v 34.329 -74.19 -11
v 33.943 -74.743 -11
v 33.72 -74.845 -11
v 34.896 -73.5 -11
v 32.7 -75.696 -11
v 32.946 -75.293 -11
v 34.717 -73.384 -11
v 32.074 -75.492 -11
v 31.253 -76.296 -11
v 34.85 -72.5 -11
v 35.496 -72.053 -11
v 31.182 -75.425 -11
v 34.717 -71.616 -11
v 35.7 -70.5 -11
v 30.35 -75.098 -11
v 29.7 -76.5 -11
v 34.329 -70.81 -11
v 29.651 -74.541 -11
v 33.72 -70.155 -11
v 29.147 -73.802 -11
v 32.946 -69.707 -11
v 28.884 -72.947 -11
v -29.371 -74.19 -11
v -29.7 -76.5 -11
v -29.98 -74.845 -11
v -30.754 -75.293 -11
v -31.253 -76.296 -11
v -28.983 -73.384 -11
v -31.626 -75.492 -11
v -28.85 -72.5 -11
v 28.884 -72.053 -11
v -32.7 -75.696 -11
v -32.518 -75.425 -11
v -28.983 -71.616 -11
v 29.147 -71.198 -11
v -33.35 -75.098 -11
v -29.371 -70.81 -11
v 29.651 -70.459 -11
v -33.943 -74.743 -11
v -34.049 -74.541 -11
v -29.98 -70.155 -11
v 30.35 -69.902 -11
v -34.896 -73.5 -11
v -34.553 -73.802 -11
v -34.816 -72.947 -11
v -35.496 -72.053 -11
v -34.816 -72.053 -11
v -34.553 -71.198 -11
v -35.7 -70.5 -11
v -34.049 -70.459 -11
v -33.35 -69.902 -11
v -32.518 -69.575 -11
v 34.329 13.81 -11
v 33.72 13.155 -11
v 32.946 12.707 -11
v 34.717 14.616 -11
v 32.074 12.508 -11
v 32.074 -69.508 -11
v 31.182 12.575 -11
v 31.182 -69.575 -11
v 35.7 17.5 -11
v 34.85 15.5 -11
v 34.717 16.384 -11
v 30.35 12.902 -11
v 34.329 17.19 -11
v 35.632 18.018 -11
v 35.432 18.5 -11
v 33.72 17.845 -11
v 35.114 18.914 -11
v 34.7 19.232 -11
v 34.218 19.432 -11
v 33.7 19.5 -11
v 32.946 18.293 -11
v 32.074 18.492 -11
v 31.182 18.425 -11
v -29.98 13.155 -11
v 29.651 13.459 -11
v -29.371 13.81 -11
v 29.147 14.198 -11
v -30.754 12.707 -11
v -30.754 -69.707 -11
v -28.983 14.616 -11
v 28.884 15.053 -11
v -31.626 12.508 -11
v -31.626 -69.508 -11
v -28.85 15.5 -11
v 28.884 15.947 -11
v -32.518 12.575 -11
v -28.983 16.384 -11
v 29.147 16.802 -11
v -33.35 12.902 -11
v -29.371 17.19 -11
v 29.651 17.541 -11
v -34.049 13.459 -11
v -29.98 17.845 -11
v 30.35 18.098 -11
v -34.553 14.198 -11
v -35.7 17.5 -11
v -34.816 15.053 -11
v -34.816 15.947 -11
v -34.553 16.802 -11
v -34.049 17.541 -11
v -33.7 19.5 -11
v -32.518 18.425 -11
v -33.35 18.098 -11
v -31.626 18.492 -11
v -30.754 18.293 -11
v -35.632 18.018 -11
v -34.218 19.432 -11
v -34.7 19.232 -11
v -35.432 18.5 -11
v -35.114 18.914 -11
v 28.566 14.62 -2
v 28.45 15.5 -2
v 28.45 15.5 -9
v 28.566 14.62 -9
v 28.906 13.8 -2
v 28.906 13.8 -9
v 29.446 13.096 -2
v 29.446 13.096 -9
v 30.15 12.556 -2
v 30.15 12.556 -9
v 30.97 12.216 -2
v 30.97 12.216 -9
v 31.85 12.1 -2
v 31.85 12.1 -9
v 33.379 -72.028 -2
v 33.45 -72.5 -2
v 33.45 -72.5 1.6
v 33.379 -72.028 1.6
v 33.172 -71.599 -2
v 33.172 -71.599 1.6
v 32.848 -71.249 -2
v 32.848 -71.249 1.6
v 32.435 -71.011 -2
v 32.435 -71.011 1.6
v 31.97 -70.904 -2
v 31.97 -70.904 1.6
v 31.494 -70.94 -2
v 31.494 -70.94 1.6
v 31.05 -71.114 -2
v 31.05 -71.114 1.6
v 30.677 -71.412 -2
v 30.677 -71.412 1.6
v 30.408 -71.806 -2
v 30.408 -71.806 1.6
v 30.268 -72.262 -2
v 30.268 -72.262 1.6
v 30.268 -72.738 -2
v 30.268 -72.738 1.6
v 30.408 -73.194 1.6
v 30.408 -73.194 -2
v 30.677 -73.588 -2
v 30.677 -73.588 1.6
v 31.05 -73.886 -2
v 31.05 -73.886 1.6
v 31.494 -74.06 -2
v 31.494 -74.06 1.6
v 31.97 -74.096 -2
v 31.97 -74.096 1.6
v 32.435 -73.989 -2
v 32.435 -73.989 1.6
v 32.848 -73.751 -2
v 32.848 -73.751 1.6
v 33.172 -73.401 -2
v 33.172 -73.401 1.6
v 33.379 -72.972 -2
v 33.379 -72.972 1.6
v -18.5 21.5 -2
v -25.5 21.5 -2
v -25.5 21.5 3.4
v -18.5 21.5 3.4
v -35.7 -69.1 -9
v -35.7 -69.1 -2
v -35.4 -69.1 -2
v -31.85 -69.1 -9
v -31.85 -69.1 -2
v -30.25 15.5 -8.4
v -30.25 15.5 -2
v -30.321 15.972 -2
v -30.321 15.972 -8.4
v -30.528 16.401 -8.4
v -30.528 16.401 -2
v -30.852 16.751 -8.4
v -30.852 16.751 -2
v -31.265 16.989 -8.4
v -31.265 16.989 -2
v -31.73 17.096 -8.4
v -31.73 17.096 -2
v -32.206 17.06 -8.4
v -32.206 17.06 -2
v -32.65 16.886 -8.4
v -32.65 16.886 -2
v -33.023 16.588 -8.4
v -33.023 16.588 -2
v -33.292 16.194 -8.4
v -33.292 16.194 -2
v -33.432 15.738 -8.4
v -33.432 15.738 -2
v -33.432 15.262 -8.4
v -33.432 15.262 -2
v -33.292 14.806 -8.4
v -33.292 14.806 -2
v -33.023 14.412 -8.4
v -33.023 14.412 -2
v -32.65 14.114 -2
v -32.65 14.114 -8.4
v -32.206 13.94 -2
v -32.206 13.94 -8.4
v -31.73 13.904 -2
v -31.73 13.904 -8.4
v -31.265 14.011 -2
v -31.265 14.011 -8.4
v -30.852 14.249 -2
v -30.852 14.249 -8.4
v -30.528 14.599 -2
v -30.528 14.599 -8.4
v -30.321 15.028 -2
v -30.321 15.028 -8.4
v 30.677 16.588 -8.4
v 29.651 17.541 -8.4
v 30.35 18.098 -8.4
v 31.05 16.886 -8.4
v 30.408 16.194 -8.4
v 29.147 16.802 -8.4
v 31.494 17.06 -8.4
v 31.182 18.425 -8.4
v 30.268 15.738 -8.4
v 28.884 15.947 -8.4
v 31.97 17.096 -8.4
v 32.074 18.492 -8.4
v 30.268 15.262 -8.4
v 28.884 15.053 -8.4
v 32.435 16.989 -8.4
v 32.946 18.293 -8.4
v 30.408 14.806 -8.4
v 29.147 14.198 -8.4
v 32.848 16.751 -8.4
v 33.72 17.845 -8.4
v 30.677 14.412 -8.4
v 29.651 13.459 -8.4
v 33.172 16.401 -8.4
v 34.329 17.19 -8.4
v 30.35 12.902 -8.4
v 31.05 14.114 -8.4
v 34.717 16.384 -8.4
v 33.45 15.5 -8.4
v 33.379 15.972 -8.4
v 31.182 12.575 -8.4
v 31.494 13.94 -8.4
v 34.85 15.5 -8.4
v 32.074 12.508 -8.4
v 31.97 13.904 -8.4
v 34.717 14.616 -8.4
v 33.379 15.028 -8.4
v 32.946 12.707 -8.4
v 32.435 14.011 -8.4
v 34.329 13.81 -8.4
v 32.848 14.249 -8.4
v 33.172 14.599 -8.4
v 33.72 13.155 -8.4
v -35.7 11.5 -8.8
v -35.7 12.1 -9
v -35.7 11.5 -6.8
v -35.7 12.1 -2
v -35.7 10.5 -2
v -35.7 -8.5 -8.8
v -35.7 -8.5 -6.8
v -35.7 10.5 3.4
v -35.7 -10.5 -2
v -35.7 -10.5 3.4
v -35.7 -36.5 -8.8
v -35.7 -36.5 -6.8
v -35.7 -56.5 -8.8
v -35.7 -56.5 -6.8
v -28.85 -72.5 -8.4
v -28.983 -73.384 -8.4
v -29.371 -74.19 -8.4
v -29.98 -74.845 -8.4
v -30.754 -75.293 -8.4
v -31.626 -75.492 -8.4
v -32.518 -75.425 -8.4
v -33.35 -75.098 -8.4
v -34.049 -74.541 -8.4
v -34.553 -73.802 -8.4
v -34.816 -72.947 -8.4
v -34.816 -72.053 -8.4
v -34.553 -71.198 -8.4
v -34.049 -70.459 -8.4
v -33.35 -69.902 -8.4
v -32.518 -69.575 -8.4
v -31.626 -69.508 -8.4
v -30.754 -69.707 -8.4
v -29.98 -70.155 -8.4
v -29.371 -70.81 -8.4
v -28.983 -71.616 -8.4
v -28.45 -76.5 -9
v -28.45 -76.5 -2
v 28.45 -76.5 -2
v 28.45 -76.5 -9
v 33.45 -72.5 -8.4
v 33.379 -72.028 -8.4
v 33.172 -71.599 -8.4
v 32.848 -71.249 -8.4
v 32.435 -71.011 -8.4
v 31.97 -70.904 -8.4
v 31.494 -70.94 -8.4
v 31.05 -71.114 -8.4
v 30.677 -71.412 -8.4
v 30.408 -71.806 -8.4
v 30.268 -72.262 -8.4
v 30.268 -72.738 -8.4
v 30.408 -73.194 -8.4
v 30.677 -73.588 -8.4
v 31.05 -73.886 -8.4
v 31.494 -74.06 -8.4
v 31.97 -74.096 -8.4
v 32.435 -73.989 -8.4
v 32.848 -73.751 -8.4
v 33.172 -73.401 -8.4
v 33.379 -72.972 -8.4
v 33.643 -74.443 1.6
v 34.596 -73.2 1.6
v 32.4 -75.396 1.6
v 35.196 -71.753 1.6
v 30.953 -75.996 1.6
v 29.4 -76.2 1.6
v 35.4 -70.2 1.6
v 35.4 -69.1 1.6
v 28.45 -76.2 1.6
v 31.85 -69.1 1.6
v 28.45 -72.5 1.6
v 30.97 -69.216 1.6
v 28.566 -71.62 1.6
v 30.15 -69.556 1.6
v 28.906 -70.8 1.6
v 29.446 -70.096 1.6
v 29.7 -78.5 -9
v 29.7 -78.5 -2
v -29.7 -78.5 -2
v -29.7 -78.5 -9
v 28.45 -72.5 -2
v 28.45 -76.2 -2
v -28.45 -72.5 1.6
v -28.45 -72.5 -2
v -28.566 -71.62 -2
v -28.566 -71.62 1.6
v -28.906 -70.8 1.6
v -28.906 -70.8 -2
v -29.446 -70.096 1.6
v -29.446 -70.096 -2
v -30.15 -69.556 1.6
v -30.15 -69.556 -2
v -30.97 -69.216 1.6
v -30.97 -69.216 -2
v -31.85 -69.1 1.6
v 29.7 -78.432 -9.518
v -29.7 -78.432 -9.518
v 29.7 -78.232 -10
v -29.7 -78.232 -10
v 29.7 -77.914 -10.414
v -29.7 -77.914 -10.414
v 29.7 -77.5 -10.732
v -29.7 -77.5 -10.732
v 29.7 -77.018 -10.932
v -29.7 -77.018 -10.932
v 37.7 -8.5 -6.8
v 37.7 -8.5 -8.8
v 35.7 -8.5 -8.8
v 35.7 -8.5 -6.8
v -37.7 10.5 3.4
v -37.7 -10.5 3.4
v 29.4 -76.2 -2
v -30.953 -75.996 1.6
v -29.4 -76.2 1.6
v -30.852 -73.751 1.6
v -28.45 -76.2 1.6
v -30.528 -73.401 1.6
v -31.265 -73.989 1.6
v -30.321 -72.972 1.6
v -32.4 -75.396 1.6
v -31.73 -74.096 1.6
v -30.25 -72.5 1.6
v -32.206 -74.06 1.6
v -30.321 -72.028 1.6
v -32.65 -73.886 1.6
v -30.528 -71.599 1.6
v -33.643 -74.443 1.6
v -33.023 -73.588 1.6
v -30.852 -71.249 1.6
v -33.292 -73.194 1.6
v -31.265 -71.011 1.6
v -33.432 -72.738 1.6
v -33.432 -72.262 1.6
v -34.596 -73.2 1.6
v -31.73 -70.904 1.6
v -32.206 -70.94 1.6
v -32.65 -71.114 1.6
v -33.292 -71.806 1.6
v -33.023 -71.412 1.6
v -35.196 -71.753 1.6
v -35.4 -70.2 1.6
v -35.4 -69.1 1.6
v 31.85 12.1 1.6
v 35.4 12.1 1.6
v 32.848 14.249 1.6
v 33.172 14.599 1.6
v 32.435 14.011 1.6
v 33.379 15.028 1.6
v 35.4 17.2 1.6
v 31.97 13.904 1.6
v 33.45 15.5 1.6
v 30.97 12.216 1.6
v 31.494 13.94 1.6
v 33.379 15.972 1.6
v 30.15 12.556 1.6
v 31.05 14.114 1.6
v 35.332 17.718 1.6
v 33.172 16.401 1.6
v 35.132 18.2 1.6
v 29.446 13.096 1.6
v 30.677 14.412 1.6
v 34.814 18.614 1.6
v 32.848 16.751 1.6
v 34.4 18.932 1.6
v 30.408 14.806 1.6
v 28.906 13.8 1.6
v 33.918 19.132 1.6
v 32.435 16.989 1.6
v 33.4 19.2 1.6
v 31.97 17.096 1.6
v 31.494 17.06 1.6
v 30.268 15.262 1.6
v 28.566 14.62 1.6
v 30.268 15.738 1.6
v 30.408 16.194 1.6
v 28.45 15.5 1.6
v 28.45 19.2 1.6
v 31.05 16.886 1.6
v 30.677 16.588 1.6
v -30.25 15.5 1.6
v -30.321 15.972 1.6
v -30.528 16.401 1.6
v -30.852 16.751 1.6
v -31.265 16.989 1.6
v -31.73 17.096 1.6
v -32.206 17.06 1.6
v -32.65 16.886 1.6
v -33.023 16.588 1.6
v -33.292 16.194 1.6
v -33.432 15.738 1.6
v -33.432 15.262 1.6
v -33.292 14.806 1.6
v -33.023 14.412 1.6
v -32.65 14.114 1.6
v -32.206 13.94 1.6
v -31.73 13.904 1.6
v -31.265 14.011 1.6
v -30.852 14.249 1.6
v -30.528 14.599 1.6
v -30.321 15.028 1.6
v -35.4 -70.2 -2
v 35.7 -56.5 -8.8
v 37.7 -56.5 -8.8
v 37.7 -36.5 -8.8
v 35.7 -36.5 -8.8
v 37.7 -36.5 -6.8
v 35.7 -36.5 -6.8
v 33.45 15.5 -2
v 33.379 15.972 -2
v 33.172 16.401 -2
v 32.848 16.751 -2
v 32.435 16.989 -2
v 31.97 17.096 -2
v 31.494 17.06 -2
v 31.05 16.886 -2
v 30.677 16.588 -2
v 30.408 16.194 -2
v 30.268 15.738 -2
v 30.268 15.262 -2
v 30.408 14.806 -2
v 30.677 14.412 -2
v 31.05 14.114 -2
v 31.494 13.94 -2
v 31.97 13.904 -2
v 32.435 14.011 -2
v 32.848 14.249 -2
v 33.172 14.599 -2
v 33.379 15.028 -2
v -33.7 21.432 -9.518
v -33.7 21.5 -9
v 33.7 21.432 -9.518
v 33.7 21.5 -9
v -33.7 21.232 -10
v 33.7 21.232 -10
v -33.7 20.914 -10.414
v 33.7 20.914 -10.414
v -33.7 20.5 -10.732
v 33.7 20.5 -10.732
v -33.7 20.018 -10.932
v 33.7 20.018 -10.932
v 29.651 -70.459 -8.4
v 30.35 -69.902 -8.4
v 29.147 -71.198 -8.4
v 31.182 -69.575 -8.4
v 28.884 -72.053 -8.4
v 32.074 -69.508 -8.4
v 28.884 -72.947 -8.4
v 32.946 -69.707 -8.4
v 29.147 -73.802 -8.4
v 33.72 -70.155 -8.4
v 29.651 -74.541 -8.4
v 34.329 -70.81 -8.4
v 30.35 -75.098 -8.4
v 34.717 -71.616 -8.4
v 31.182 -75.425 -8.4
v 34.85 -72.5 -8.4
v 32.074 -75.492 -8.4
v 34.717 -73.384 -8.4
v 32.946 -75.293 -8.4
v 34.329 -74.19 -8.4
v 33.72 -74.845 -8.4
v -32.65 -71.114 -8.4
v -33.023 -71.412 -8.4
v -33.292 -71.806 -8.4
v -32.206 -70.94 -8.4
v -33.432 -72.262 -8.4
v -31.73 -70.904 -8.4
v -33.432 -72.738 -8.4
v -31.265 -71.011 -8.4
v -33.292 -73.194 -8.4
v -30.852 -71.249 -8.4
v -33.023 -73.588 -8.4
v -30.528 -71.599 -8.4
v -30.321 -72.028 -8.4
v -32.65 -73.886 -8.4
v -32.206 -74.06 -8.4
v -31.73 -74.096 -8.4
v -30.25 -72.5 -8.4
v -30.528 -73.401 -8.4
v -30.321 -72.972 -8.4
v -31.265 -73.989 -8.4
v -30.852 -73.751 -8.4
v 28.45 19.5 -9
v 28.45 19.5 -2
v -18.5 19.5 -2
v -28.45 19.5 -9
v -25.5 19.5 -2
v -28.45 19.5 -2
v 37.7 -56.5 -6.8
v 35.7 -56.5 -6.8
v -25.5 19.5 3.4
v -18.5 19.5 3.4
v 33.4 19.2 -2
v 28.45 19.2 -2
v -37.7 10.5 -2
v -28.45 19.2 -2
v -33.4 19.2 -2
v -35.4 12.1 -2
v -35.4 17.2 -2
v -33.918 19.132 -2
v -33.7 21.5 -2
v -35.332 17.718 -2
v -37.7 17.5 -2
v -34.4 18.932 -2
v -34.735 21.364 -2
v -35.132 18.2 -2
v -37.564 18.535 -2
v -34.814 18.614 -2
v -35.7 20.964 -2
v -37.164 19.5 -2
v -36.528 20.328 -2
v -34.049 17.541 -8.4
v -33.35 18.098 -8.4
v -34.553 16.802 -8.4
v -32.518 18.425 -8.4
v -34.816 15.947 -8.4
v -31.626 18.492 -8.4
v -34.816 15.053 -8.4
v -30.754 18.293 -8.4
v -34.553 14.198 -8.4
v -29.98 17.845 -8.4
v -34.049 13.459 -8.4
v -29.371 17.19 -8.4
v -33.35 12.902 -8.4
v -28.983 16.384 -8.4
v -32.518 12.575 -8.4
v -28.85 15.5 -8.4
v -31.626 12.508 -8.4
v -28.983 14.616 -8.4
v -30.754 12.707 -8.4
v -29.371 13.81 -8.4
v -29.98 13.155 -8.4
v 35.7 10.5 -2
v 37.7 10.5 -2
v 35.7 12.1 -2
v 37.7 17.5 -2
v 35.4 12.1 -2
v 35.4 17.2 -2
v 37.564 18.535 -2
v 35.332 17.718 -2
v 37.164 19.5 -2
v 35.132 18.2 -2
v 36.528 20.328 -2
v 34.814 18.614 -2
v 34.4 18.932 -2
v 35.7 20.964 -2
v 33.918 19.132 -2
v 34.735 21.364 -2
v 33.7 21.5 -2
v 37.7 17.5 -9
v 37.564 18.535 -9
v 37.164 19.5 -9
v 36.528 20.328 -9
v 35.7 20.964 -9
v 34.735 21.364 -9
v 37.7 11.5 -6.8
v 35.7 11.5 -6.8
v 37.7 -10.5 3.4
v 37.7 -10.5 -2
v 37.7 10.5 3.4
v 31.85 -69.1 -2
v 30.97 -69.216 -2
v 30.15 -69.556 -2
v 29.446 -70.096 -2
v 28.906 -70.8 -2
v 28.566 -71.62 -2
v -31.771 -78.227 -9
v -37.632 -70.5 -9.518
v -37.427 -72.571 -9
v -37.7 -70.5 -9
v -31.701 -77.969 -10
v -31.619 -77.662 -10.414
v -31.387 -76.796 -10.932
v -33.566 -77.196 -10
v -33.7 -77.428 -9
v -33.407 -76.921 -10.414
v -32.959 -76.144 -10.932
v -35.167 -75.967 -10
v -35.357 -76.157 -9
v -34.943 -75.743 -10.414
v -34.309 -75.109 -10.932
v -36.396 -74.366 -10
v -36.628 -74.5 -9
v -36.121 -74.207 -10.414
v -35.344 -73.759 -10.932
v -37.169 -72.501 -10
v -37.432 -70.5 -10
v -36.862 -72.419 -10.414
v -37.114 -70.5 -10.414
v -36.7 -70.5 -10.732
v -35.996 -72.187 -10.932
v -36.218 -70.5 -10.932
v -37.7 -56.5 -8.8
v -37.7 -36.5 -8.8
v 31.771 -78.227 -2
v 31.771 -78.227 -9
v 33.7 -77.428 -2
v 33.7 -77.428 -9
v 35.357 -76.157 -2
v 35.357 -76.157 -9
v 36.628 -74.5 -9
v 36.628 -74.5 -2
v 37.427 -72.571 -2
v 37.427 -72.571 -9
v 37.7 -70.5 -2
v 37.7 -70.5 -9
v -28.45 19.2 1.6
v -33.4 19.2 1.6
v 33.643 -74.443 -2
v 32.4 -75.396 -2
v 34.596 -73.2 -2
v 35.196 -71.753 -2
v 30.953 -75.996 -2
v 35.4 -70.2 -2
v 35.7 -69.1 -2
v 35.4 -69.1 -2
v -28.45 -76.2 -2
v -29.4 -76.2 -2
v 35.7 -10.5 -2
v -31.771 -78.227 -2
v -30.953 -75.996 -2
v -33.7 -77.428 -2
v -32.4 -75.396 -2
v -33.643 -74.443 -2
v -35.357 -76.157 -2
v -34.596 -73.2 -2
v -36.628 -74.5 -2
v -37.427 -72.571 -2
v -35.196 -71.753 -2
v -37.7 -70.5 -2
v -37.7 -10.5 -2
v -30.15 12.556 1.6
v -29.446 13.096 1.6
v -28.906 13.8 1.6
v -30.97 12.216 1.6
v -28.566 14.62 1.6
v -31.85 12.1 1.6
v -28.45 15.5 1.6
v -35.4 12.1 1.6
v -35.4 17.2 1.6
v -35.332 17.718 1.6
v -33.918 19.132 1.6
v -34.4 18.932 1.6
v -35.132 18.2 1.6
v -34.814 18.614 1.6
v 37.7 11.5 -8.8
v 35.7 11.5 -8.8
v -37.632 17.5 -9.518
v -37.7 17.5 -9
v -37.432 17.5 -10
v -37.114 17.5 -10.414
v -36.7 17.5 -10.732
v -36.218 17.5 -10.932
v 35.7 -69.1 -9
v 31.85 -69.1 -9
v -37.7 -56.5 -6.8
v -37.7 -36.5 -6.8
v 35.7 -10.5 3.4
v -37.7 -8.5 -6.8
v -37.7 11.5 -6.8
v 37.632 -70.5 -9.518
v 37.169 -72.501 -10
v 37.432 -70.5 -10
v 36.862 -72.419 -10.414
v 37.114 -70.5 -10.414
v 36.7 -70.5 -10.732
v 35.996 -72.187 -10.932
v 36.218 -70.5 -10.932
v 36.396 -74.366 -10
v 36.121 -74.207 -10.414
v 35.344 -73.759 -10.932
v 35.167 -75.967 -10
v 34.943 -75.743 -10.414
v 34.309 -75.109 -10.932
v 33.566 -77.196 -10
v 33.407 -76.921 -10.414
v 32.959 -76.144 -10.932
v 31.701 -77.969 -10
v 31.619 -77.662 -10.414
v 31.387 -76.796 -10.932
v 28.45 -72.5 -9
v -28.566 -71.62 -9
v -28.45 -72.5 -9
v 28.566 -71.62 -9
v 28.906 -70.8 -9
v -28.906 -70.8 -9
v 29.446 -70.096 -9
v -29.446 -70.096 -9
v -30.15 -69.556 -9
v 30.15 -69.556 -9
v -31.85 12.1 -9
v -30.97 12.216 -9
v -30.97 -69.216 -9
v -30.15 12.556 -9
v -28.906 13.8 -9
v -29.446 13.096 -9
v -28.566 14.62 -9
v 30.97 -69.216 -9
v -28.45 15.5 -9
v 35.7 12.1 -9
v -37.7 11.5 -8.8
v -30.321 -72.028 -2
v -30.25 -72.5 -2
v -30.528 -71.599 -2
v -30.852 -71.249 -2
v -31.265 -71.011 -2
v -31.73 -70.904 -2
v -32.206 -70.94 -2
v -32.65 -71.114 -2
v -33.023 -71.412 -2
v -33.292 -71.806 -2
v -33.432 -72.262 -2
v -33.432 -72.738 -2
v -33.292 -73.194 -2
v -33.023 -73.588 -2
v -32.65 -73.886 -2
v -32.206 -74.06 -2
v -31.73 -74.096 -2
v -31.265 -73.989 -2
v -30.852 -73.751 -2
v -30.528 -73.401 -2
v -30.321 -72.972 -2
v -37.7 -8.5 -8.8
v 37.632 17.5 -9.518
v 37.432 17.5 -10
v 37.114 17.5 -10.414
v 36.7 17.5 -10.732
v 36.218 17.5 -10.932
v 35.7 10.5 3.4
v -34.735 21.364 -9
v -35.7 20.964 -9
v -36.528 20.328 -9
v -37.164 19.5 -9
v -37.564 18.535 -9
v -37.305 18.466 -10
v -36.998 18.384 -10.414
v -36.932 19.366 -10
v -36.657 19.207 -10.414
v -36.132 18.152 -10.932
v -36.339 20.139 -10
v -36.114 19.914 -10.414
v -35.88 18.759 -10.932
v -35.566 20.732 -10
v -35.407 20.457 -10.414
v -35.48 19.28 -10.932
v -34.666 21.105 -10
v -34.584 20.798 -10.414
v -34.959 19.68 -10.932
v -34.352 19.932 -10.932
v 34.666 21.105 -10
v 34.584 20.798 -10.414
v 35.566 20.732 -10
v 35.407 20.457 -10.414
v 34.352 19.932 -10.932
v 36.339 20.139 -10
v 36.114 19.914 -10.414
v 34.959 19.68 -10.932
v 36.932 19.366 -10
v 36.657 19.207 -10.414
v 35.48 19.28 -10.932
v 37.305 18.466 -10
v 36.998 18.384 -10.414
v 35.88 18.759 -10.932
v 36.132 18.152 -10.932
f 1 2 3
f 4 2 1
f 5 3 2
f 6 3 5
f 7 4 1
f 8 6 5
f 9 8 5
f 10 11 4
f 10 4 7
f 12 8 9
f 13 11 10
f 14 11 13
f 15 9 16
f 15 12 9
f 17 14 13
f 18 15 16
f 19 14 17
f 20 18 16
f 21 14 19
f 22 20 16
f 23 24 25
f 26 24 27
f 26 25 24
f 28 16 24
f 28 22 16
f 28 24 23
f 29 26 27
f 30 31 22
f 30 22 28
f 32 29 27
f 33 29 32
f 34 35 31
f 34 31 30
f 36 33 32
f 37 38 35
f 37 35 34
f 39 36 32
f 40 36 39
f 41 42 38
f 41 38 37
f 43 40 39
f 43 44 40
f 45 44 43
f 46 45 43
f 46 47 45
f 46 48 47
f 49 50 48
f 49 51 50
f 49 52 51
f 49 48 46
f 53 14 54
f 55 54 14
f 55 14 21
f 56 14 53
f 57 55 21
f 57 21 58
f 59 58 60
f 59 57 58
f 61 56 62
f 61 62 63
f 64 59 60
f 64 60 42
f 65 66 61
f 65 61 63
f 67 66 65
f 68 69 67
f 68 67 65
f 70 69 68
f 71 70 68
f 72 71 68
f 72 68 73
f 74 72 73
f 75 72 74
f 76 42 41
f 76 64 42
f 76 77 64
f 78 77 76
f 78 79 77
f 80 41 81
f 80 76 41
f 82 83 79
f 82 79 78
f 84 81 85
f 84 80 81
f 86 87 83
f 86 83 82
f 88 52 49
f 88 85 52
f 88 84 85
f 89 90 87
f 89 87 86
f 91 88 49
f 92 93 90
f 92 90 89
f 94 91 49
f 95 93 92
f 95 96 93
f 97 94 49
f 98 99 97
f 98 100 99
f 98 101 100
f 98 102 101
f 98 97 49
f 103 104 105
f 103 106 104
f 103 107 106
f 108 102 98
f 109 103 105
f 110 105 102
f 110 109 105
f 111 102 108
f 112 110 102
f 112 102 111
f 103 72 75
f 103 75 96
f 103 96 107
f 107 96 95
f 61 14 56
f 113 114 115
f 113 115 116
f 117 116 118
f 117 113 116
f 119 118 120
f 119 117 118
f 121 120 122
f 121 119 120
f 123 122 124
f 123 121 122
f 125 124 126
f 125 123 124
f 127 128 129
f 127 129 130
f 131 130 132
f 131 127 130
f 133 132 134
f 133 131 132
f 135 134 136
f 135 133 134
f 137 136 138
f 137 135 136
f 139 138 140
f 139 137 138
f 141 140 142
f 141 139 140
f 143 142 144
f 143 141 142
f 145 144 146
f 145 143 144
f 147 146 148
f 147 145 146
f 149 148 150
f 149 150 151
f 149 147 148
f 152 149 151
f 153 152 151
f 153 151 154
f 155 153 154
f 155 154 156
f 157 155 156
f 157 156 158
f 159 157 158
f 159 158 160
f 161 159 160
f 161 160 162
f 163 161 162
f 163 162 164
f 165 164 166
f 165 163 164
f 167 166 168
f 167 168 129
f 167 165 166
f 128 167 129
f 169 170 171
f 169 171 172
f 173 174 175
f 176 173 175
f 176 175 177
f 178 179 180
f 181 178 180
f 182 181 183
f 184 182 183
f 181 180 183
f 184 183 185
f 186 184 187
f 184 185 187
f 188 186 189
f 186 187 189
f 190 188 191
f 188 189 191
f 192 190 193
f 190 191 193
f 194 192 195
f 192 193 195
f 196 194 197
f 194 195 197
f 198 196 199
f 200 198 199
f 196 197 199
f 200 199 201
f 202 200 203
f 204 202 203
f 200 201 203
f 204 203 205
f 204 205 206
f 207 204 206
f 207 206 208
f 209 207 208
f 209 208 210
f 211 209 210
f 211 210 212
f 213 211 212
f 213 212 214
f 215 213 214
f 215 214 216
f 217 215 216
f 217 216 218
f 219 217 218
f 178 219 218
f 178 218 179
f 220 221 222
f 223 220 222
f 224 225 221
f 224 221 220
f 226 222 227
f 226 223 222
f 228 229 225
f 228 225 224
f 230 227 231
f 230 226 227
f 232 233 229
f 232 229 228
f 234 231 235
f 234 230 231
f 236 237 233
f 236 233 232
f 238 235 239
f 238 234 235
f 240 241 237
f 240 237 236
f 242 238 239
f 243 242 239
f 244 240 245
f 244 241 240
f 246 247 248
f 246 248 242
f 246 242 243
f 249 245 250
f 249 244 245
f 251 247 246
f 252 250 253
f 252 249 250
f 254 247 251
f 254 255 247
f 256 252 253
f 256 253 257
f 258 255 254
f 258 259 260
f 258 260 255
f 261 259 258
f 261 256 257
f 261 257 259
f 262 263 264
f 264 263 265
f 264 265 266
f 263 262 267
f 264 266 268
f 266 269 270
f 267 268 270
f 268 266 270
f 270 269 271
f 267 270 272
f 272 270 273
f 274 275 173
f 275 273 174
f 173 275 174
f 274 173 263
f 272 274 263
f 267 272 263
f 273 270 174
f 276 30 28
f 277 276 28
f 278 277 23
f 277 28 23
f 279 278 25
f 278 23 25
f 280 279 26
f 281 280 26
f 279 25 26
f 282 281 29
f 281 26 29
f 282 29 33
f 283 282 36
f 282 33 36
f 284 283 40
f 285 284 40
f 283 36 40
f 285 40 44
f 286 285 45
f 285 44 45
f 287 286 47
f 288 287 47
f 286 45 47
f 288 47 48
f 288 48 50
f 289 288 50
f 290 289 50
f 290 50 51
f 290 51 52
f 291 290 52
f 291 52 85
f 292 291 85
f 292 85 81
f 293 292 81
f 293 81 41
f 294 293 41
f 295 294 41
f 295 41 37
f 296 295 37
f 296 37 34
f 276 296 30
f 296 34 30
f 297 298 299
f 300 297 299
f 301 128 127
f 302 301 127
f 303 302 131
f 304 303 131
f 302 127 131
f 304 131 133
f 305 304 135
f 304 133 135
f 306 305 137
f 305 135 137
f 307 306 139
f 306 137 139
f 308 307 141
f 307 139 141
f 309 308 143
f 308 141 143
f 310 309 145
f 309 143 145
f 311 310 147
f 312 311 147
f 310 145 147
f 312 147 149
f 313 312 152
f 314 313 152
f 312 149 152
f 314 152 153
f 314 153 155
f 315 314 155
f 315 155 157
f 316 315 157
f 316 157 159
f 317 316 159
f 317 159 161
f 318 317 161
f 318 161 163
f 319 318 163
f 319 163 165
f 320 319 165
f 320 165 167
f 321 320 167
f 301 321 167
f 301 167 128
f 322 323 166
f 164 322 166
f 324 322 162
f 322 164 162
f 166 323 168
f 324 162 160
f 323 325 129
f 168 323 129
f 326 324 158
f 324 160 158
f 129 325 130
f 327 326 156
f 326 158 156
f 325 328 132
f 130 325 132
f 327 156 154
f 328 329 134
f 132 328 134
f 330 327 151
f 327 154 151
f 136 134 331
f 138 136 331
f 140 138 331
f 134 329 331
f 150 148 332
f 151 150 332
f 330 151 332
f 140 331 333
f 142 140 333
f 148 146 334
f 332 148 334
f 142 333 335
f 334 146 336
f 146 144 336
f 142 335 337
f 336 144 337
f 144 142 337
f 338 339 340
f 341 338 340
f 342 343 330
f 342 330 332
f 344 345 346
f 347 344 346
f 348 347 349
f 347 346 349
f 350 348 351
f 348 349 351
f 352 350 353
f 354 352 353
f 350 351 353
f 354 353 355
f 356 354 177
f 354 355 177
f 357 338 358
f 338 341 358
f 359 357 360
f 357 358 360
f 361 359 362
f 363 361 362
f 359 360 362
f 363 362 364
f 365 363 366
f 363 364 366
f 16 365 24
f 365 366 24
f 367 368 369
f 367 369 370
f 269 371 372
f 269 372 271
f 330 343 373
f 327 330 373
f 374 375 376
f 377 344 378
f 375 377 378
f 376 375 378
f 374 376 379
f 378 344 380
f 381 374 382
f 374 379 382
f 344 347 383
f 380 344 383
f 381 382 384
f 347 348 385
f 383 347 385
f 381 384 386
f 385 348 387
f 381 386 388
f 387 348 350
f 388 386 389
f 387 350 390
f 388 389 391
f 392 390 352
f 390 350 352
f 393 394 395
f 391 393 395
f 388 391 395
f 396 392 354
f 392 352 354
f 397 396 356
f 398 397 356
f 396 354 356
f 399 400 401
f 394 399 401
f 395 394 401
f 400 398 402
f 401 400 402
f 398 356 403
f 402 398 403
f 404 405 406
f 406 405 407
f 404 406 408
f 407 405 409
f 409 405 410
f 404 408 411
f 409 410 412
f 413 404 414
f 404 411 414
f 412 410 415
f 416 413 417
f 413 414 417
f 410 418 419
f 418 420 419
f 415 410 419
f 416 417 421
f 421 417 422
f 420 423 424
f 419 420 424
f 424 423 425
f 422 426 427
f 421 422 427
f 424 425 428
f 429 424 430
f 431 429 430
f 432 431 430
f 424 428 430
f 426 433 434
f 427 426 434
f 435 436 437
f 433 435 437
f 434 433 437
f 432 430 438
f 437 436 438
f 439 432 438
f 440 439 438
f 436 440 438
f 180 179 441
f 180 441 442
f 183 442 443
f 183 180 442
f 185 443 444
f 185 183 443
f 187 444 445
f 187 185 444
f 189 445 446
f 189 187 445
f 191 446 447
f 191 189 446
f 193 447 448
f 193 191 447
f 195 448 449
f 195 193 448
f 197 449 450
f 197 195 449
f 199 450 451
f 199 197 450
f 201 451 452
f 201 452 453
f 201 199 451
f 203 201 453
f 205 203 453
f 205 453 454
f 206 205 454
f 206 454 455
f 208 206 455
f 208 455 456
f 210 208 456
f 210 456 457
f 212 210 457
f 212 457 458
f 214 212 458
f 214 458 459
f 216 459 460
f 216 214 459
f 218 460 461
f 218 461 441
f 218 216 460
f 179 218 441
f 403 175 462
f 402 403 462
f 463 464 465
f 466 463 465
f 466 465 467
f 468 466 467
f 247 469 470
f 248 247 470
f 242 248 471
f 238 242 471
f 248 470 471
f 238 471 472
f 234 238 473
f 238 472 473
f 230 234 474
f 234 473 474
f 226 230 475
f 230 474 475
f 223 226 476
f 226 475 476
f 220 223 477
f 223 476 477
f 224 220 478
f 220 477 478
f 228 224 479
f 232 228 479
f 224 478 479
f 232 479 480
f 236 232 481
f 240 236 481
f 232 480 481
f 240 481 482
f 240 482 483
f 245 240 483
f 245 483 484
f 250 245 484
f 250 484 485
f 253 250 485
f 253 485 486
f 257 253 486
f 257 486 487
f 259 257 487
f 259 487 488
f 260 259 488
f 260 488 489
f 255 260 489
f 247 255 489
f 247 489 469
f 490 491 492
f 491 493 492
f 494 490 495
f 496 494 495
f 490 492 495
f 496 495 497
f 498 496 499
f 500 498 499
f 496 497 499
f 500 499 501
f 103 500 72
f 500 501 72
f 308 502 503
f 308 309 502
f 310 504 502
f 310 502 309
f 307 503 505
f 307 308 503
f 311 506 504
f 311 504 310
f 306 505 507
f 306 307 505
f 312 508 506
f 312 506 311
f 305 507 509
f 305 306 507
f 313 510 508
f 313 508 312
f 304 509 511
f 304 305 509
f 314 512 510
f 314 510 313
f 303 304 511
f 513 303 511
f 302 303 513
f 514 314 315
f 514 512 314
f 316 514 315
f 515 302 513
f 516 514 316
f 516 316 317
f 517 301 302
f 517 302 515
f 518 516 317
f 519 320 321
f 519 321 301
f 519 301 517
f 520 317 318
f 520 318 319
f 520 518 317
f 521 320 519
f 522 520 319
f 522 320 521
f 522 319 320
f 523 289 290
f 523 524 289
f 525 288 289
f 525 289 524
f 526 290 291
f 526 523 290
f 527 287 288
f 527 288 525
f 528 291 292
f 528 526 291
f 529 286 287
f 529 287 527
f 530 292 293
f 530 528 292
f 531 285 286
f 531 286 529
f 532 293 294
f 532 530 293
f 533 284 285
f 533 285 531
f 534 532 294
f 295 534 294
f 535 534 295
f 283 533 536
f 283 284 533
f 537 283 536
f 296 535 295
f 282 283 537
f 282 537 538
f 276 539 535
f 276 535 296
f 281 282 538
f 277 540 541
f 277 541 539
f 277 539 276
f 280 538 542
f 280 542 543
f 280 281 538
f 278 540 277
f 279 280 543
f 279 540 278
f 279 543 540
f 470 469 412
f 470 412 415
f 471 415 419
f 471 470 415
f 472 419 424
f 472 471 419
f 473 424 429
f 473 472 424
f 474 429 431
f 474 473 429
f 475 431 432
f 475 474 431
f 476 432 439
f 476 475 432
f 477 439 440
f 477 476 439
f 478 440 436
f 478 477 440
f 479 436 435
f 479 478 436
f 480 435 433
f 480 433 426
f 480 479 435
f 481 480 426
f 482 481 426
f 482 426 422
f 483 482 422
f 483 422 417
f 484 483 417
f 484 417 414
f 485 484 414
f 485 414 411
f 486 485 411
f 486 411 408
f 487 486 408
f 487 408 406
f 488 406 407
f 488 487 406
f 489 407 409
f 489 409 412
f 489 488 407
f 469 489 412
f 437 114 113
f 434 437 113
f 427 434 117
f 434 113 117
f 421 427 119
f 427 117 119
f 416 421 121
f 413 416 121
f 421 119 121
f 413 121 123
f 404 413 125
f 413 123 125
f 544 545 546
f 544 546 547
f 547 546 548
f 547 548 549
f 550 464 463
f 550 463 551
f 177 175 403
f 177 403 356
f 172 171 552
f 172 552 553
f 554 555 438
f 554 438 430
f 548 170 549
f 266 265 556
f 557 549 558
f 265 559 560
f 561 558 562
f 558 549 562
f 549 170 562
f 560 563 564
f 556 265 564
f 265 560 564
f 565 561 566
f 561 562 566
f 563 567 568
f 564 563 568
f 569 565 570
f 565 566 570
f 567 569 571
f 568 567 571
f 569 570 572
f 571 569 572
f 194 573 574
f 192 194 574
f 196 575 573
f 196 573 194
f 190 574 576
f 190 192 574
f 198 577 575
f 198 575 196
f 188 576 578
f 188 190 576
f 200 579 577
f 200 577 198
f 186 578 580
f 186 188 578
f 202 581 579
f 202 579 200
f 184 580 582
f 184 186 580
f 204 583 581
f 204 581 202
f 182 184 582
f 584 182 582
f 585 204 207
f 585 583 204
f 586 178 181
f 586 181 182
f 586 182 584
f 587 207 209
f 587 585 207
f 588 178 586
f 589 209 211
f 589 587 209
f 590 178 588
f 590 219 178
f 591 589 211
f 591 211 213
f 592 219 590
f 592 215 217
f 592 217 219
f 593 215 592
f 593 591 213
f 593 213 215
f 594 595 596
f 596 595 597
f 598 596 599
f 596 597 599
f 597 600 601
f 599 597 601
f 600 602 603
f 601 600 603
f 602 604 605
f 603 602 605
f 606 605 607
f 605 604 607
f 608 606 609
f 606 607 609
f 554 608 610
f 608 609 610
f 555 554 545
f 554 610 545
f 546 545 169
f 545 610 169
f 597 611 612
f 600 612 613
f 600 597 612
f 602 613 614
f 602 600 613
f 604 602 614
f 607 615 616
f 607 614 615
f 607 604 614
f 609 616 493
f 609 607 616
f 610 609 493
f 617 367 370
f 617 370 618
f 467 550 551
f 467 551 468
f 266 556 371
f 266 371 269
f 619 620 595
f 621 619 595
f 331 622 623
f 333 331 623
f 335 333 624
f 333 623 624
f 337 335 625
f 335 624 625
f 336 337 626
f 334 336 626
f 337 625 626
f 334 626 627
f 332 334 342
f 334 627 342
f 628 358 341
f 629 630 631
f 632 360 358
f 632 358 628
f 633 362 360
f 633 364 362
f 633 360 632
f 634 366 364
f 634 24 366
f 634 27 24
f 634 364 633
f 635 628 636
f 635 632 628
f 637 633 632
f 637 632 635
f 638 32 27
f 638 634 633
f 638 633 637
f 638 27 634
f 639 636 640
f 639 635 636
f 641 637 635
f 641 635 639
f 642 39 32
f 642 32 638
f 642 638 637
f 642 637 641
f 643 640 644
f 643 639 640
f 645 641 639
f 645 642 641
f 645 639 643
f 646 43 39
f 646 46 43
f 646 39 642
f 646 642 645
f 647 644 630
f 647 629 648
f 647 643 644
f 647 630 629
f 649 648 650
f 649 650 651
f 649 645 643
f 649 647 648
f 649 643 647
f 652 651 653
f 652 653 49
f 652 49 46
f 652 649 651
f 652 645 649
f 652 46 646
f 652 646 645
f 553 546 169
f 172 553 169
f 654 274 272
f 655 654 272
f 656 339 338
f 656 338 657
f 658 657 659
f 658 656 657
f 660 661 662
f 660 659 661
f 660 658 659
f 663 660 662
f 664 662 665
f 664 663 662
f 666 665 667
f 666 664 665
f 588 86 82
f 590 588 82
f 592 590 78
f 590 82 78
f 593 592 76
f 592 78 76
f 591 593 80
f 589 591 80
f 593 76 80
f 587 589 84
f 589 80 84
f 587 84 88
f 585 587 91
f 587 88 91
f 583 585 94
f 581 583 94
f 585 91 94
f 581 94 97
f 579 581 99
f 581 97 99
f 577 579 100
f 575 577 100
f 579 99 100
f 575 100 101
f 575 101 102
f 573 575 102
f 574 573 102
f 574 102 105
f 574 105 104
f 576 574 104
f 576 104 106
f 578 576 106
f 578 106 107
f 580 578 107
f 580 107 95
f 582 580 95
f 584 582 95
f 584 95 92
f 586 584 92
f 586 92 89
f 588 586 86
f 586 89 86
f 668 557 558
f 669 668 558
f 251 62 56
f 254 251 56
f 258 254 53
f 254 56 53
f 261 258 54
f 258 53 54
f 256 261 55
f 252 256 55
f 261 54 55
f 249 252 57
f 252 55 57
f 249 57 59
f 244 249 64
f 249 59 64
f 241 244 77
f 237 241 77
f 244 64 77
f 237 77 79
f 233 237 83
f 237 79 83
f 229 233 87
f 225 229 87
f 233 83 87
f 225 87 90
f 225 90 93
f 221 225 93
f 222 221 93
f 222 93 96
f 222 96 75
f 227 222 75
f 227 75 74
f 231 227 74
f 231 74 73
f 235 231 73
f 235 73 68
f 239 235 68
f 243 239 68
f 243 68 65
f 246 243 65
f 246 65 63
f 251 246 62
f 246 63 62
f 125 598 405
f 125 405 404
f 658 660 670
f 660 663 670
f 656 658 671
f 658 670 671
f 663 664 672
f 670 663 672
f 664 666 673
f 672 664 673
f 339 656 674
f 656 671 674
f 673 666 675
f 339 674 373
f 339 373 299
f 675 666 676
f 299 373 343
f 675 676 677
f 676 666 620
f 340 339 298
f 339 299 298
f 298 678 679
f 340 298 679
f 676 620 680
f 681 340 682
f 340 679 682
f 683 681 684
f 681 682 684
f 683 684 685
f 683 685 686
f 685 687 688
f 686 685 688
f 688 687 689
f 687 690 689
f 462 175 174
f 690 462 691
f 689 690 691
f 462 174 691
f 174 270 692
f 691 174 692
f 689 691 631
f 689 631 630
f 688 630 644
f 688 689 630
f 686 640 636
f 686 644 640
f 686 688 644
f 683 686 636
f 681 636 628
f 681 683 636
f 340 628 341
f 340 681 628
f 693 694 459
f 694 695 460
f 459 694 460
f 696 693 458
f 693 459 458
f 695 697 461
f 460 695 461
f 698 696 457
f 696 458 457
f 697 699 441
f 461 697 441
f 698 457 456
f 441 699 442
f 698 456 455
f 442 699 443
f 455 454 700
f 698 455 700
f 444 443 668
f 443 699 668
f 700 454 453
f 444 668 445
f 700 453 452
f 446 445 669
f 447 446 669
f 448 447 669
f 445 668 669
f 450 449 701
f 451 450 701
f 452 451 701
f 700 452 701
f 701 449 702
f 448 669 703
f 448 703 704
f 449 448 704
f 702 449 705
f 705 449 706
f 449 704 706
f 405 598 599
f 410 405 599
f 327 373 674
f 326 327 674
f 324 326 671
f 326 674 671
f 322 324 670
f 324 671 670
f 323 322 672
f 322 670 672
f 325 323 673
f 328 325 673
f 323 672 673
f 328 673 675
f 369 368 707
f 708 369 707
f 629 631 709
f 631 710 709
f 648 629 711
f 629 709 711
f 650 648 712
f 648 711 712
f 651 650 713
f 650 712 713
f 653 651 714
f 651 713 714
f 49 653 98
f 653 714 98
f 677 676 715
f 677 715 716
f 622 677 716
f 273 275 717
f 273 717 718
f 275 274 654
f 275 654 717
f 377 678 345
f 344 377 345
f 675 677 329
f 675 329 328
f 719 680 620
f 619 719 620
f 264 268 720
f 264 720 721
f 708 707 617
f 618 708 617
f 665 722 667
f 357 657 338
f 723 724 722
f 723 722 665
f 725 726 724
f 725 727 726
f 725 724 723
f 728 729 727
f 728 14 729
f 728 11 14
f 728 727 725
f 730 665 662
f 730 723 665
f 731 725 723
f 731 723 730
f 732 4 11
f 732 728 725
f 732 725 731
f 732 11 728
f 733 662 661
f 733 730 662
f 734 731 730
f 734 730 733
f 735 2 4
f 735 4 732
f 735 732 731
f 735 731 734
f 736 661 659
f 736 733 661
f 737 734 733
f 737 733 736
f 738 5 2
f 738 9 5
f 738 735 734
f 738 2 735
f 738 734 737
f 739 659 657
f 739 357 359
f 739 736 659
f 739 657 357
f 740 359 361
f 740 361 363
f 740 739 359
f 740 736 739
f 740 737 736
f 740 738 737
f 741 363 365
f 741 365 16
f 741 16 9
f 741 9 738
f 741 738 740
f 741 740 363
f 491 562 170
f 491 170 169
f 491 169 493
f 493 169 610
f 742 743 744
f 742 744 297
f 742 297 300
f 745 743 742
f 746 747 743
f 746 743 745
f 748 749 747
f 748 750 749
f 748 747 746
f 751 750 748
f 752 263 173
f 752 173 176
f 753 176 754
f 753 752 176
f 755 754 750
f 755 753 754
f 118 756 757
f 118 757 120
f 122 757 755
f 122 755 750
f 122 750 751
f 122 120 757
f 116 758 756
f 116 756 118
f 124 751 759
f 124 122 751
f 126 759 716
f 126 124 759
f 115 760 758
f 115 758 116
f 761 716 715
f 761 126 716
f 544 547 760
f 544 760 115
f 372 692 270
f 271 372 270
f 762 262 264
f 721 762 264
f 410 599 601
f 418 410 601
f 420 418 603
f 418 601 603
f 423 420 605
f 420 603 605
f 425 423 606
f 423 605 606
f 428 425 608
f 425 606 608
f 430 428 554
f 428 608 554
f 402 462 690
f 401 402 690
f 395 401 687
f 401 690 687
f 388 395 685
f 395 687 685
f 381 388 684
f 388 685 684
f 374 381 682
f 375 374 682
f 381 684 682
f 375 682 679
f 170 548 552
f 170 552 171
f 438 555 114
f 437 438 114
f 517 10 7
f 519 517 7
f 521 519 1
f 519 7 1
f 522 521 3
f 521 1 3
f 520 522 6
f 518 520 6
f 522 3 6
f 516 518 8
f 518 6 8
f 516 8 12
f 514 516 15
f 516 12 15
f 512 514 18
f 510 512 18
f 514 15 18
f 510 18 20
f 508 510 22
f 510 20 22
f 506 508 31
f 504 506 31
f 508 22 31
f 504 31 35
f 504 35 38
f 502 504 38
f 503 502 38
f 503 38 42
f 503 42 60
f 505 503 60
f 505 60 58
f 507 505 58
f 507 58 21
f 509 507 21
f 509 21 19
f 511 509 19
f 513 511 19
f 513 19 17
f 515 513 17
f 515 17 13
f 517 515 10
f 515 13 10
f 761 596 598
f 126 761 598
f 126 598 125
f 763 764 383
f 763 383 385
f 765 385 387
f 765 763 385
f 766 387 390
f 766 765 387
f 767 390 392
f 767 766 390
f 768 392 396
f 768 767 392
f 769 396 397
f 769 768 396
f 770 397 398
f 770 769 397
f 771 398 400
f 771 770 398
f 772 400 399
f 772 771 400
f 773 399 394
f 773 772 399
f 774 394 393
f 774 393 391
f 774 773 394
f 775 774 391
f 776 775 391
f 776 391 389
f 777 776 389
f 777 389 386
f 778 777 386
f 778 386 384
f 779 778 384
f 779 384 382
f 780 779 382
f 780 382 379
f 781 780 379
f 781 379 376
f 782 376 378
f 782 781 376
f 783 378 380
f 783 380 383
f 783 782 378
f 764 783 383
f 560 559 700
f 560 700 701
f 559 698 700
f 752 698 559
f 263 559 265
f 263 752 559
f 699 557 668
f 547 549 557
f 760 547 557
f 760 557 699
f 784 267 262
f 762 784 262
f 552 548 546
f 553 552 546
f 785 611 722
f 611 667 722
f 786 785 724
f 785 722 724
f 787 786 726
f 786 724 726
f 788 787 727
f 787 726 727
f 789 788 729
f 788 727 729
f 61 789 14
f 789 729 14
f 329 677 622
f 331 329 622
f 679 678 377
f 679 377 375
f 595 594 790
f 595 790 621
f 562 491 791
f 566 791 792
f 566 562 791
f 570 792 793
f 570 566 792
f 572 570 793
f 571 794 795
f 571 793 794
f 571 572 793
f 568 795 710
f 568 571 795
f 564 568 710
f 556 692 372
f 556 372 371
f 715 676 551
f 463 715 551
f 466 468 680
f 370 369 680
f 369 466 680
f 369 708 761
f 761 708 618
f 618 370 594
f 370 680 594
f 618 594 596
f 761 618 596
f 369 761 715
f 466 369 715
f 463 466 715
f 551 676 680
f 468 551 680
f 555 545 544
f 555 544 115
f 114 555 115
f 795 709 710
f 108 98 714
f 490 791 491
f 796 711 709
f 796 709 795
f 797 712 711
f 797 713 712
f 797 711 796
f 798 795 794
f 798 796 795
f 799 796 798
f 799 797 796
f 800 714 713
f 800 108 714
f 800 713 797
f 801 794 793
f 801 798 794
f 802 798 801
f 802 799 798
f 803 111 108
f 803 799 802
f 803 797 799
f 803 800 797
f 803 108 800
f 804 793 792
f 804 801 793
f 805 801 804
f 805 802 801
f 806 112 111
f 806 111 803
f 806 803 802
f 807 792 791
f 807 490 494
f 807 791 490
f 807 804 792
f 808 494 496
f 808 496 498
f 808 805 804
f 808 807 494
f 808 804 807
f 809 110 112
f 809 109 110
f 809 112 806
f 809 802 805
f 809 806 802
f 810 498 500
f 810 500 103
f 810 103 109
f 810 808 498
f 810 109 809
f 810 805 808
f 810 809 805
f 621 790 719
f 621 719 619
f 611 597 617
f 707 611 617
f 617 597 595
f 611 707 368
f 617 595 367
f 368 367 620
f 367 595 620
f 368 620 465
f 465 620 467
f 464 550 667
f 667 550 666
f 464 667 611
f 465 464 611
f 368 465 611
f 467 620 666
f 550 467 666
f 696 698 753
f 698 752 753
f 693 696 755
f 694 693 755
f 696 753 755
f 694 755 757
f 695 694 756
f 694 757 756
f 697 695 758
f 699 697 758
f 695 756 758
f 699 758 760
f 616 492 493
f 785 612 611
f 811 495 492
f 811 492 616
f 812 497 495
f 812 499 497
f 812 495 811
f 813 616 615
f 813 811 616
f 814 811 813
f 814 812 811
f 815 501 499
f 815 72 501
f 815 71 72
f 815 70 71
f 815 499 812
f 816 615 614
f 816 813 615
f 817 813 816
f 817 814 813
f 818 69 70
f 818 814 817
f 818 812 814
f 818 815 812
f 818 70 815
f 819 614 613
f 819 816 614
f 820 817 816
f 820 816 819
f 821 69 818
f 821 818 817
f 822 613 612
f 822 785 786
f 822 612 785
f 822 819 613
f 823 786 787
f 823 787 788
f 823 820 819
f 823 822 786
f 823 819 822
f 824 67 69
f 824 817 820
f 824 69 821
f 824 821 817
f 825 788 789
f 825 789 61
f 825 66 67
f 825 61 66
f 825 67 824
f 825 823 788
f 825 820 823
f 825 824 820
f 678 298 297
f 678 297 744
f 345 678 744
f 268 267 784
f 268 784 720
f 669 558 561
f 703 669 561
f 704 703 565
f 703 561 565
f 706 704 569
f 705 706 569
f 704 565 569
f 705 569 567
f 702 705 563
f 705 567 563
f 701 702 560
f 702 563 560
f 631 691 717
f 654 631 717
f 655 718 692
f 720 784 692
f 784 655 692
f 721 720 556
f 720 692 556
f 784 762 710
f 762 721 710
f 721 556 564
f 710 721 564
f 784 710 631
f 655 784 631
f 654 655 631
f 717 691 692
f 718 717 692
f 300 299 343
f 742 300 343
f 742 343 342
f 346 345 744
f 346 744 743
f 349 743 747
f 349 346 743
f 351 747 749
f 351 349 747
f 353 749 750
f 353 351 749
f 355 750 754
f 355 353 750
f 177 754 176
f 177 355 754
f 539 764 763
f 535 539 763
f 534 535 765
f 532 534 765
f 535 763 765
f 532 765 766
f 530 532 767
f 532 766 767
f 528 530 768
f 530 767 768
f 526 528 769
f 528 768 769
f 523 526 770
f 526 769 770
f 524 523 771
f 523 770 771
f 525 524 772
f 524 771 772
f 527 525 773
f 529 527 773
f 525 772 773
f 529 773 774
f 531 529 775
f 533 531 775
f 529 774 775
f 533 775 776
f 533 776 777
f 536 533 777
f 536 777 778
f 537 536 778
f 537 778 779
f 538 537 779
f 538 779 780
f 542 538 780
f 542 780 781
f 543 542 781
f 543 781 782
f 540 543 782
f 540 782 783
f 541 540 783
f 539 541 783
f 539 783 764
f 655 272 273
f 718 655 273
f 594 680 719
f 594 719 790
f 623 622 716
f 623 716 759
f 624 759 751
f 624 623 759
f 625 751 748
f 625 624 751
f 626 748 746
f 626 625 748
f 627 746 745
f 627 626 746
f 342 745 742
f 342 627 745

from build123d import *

# Parameters (mm, degrees)
PAD014_DEPTH    = 9
FILLET012_R     = 2
SKETCH024_R     = 3
POCKET009_DEPTH = 2.6
SKETCH025_R     = 1.6
POCKET010_DEPTH = 7
SKETCH026_R     = 1.6
PAD015_DEPTH    = 3.6
SKETCH027_W     = 2
SKETCH027_H     = 21
SKETCH027_W_2   = 7
SKETCH027_H_2   = 2
PAD016_DEPTH    = 5.4
SKETCH028_W     = 20
SKETCH028_H     = 2
POCKET011_DEPTH = 77.701


with BuildPart() as part:
    # Sketch023 → Pad014 (new body)
    with BuildSketch(Plane.XY):
        with BuildLine():
            Line((-33.7, 21.5), (33.7, 21.5))
            ThreePointArc((37.7, 17.5), (36.528427, 20.328427), (33.7, 21.5))
            Line((37.7, 17.5), (37.7, -70.5))
            ThreePointArc((29.7, -78.5), (35.356854, -76.156854), (37.7, -70.5))
            Line((29.7, -78.5), (-29.7, -78.5))
            ThreePointArc((-37.7, -70.5), (-35.356854, -76.156854), (-29.7, -78.5))
            Line((-37.7, -70.5), (-37.7, 17.5))
            ThreePointArc((-33.7, 21.5), (-36.528427, 20.328427), (-37.7, 17.5))
        make_face()
    extrude(amount=-PAD014_DEPTH)

    # Fillet012
    fillet012_edges = [part.edges().sort_by_distance(p)[0] for p in [
        (0, 21.5, -9),
    ]]
    fillet(fillet012_edges, radius=FILLET012_R)

    # Sketch024 (on Face8 of Fillet012) → Pocket009 (cut)
    with BuildSketch(Plane(origin=(0, 0, -9), x_dir=(1, 0, 0), z_dir=(0, 0, -1))):
        with Locations((-31.85, 72.5)):
            Circle(SKETCH024_R)
        with Locations((31.85, 72.5)):
            Circle(SKETCH024_R)
        with Locations((-31.85, -15.5)):
            Circle(SKETCH024_R)
        with Locations((31.85, -15.5)):
            Circle(SKETCH024_R)
    extrude(amount=-POCKET009_DEPTH, mode=Mode.SUBTRACT)

    # Sketch025 (on Face4 of Pocket009) → Pocket010 (cut)
    with BuildSketch(Plane.XY):
        with Locations((-31.85, 15.5)):
            Circle(SKETCH025_R)
        with Locations((31.85, 15.5)):
            Circle(SKETCH025_R)
        with Locations((31.85, -72.5)):
            Circle(SKETCH025_R)
        with Locations((-31.85, -72.5)):
            Circle(SKETCH025_R)
        with BuildLine():
            Line((-31.85, 12.1), (-35.7, 12.1))
            Line((-35.7, 12.1), (-35.7, -69.1))
            Line((-35.7, -69.1), (-31.85, -69.1))
            ThreePointArc((-28.45, -72.5), (-29.445837, -70.095837), (-31.85, -69.1))
            Line((-28.45, -76.5), (-28.45, -72.5))
            Line((-28.45, -76.5), (28.45, -76.5))
            Line((28.45, -76.5), (28.45, -72.5))
            ThreePointArc((31.85, -69.1), (29.445837, -70.095837), (28.45, -72.5))
            Line((35.7, -69.1), (31.85, -69.1))
            Line((35.7, -69.1), (35.7, 12.1))
            Line((35.7, 12.1), (31.85, 12.1))
            ThreePointArc((28.45, 15.5), (29.445837, 13.095837), (31.85, 12.1))
            Line((28.45, 19.5), (28.45, 15.5))
            Line((28.45, 19.5), (-28.45, 19.5))
            Line((-28.45, 19.5), (-28.45, 15.5))
            ThreePointArc((-31.85, 12.1), (-29.445837, 13.095837), (-28.45, 15.5))
        make_face()
    extrude(amount=-POCKET010_DEPTH, mode=Mode.SUBTRACT)

    # Sketch026 (on Face4 of Pocket010) → Pad015 (join)
    with BuildSketch(Plane.XY):
        with BuildLine():
            Line((-31.85, 12.1), (-35.4, 12.1))
            Line((-35.4, 12.1), (-35.4, 17.2))
            ThreePointArc((-33.4, 19.2), (-34.814214, 18.614214), (-35.4, 17.2))
            Line((-28.45, 19.2), (-33.4, 19.2))
            Line((-28.45, 19.2), (-28.45, 15.5))
            ThreePointArc((-31.85, 12.1), (-29.445837, 13.095837), (-28.45, 15.5))
        make_face()
        with Locations((-31.85, 15.5)):
            Circle(SKETCH026_R, mode=Mode.SUBTRACT)
        with BuildLine():
            Line((35.4, 12.1), (31.85, 12.1))
            ThreePointArc((28.45, 15.5), (29.445837, 13.095837), (31.85, 12.1))
            Line((28.45, 19.2), (28.45, 15.5))
            Line((28.45, 19.2), (33.4, 19.2))
            ThreePointArc((35.4, 17.2), (34.814214, 18.614214), (33.4, 19.2))
            Line((35.4, 12.1), (35.4, 17.2))
        make_face()
        with Locations((31.85, 15.5)):
            Circle(SKETCH026_R, mode=Mode.SUBTRACT)
        with BuildLine():
            Line((28.45, -76.2), (28.45, -72.5))
            ThreePointArc((31.85, -69.1), (29.445837, -70.095837), (28.45, -72.5))
            Line((35.4, -69.1), (31.85, -69.1))
            Line((35.4, -69.1), (35.4, -70.2))
            ThreePointArc((29.4, -76.2), (33.642641, -74.442641), (35.4, -70.2))
            Line((28.45, -76.2), (29.4, -76.2))
        make_face()
        with Locations((31.85, -72.5)):
            Circle(SKETCH026_R, mode=Mode.SUBTRACT)
        with BuildLine():
            Line((-35.4, -69.1), (-31.85, -69.1))
            ThreePointArc((-28.45, -72.5), (-29.445837, -70.095837), (-31.85, -69.1))
            Line((-28.45, -76.2), (-28.45, -72.5))
            Line((-28.45, -76.2), (-29.4, -76.2))
            ThreePointArc((-35.4, -70.2), (-33.642641, -74.442641), (-29.4, -76.2))
            Line((-35.4, -69.1), (-35.4, -70.2))
        make_face()
        with Locations((-31.85, -72.5)):
            Circle(SKETCH026_R, mode=Mode.SUBTRACT)
    extrude(amount=PAD015_DEPTH)

    # Sketch027 (on Face4 of Pad015) → Pad016 (join)
    with BuildSketch(Plane.XY):
        with Locations((-36.7, 0)):
            Rectangle(SKETCH027_W, SKETCH027_H)
        with Locations((36.7, 0)):
            Rectangle(SKETCH027_W, SKETCH027_H)
        with Locations((-22, 20.5)):
            Rectangle(SKETCH027_W_2, SKETCH027_H_2)
    extrude(amount=PAD016_DEPTH)

    # Sketch028 → Pocket011 (cut, through all)
    with BuildSketch(Plane.YZ.offset(40)):
        with Locations((-46.5, -5.8)):
            Rectangle(SKETCH028_W, SKETCH028_H)
        with Locations((1.5, -5.8)):
            Rectangle(SKETCH028_W, SKETCH028_H)
    extrude(amount=-POCKET011_DEPTH, mode=Mode.SUBTRACT)


with BuildPart() as part_1:
    # Body006 placement: moved
    add(part.part.moved(Location((0, 0, -2))))


solid = part_1.part
